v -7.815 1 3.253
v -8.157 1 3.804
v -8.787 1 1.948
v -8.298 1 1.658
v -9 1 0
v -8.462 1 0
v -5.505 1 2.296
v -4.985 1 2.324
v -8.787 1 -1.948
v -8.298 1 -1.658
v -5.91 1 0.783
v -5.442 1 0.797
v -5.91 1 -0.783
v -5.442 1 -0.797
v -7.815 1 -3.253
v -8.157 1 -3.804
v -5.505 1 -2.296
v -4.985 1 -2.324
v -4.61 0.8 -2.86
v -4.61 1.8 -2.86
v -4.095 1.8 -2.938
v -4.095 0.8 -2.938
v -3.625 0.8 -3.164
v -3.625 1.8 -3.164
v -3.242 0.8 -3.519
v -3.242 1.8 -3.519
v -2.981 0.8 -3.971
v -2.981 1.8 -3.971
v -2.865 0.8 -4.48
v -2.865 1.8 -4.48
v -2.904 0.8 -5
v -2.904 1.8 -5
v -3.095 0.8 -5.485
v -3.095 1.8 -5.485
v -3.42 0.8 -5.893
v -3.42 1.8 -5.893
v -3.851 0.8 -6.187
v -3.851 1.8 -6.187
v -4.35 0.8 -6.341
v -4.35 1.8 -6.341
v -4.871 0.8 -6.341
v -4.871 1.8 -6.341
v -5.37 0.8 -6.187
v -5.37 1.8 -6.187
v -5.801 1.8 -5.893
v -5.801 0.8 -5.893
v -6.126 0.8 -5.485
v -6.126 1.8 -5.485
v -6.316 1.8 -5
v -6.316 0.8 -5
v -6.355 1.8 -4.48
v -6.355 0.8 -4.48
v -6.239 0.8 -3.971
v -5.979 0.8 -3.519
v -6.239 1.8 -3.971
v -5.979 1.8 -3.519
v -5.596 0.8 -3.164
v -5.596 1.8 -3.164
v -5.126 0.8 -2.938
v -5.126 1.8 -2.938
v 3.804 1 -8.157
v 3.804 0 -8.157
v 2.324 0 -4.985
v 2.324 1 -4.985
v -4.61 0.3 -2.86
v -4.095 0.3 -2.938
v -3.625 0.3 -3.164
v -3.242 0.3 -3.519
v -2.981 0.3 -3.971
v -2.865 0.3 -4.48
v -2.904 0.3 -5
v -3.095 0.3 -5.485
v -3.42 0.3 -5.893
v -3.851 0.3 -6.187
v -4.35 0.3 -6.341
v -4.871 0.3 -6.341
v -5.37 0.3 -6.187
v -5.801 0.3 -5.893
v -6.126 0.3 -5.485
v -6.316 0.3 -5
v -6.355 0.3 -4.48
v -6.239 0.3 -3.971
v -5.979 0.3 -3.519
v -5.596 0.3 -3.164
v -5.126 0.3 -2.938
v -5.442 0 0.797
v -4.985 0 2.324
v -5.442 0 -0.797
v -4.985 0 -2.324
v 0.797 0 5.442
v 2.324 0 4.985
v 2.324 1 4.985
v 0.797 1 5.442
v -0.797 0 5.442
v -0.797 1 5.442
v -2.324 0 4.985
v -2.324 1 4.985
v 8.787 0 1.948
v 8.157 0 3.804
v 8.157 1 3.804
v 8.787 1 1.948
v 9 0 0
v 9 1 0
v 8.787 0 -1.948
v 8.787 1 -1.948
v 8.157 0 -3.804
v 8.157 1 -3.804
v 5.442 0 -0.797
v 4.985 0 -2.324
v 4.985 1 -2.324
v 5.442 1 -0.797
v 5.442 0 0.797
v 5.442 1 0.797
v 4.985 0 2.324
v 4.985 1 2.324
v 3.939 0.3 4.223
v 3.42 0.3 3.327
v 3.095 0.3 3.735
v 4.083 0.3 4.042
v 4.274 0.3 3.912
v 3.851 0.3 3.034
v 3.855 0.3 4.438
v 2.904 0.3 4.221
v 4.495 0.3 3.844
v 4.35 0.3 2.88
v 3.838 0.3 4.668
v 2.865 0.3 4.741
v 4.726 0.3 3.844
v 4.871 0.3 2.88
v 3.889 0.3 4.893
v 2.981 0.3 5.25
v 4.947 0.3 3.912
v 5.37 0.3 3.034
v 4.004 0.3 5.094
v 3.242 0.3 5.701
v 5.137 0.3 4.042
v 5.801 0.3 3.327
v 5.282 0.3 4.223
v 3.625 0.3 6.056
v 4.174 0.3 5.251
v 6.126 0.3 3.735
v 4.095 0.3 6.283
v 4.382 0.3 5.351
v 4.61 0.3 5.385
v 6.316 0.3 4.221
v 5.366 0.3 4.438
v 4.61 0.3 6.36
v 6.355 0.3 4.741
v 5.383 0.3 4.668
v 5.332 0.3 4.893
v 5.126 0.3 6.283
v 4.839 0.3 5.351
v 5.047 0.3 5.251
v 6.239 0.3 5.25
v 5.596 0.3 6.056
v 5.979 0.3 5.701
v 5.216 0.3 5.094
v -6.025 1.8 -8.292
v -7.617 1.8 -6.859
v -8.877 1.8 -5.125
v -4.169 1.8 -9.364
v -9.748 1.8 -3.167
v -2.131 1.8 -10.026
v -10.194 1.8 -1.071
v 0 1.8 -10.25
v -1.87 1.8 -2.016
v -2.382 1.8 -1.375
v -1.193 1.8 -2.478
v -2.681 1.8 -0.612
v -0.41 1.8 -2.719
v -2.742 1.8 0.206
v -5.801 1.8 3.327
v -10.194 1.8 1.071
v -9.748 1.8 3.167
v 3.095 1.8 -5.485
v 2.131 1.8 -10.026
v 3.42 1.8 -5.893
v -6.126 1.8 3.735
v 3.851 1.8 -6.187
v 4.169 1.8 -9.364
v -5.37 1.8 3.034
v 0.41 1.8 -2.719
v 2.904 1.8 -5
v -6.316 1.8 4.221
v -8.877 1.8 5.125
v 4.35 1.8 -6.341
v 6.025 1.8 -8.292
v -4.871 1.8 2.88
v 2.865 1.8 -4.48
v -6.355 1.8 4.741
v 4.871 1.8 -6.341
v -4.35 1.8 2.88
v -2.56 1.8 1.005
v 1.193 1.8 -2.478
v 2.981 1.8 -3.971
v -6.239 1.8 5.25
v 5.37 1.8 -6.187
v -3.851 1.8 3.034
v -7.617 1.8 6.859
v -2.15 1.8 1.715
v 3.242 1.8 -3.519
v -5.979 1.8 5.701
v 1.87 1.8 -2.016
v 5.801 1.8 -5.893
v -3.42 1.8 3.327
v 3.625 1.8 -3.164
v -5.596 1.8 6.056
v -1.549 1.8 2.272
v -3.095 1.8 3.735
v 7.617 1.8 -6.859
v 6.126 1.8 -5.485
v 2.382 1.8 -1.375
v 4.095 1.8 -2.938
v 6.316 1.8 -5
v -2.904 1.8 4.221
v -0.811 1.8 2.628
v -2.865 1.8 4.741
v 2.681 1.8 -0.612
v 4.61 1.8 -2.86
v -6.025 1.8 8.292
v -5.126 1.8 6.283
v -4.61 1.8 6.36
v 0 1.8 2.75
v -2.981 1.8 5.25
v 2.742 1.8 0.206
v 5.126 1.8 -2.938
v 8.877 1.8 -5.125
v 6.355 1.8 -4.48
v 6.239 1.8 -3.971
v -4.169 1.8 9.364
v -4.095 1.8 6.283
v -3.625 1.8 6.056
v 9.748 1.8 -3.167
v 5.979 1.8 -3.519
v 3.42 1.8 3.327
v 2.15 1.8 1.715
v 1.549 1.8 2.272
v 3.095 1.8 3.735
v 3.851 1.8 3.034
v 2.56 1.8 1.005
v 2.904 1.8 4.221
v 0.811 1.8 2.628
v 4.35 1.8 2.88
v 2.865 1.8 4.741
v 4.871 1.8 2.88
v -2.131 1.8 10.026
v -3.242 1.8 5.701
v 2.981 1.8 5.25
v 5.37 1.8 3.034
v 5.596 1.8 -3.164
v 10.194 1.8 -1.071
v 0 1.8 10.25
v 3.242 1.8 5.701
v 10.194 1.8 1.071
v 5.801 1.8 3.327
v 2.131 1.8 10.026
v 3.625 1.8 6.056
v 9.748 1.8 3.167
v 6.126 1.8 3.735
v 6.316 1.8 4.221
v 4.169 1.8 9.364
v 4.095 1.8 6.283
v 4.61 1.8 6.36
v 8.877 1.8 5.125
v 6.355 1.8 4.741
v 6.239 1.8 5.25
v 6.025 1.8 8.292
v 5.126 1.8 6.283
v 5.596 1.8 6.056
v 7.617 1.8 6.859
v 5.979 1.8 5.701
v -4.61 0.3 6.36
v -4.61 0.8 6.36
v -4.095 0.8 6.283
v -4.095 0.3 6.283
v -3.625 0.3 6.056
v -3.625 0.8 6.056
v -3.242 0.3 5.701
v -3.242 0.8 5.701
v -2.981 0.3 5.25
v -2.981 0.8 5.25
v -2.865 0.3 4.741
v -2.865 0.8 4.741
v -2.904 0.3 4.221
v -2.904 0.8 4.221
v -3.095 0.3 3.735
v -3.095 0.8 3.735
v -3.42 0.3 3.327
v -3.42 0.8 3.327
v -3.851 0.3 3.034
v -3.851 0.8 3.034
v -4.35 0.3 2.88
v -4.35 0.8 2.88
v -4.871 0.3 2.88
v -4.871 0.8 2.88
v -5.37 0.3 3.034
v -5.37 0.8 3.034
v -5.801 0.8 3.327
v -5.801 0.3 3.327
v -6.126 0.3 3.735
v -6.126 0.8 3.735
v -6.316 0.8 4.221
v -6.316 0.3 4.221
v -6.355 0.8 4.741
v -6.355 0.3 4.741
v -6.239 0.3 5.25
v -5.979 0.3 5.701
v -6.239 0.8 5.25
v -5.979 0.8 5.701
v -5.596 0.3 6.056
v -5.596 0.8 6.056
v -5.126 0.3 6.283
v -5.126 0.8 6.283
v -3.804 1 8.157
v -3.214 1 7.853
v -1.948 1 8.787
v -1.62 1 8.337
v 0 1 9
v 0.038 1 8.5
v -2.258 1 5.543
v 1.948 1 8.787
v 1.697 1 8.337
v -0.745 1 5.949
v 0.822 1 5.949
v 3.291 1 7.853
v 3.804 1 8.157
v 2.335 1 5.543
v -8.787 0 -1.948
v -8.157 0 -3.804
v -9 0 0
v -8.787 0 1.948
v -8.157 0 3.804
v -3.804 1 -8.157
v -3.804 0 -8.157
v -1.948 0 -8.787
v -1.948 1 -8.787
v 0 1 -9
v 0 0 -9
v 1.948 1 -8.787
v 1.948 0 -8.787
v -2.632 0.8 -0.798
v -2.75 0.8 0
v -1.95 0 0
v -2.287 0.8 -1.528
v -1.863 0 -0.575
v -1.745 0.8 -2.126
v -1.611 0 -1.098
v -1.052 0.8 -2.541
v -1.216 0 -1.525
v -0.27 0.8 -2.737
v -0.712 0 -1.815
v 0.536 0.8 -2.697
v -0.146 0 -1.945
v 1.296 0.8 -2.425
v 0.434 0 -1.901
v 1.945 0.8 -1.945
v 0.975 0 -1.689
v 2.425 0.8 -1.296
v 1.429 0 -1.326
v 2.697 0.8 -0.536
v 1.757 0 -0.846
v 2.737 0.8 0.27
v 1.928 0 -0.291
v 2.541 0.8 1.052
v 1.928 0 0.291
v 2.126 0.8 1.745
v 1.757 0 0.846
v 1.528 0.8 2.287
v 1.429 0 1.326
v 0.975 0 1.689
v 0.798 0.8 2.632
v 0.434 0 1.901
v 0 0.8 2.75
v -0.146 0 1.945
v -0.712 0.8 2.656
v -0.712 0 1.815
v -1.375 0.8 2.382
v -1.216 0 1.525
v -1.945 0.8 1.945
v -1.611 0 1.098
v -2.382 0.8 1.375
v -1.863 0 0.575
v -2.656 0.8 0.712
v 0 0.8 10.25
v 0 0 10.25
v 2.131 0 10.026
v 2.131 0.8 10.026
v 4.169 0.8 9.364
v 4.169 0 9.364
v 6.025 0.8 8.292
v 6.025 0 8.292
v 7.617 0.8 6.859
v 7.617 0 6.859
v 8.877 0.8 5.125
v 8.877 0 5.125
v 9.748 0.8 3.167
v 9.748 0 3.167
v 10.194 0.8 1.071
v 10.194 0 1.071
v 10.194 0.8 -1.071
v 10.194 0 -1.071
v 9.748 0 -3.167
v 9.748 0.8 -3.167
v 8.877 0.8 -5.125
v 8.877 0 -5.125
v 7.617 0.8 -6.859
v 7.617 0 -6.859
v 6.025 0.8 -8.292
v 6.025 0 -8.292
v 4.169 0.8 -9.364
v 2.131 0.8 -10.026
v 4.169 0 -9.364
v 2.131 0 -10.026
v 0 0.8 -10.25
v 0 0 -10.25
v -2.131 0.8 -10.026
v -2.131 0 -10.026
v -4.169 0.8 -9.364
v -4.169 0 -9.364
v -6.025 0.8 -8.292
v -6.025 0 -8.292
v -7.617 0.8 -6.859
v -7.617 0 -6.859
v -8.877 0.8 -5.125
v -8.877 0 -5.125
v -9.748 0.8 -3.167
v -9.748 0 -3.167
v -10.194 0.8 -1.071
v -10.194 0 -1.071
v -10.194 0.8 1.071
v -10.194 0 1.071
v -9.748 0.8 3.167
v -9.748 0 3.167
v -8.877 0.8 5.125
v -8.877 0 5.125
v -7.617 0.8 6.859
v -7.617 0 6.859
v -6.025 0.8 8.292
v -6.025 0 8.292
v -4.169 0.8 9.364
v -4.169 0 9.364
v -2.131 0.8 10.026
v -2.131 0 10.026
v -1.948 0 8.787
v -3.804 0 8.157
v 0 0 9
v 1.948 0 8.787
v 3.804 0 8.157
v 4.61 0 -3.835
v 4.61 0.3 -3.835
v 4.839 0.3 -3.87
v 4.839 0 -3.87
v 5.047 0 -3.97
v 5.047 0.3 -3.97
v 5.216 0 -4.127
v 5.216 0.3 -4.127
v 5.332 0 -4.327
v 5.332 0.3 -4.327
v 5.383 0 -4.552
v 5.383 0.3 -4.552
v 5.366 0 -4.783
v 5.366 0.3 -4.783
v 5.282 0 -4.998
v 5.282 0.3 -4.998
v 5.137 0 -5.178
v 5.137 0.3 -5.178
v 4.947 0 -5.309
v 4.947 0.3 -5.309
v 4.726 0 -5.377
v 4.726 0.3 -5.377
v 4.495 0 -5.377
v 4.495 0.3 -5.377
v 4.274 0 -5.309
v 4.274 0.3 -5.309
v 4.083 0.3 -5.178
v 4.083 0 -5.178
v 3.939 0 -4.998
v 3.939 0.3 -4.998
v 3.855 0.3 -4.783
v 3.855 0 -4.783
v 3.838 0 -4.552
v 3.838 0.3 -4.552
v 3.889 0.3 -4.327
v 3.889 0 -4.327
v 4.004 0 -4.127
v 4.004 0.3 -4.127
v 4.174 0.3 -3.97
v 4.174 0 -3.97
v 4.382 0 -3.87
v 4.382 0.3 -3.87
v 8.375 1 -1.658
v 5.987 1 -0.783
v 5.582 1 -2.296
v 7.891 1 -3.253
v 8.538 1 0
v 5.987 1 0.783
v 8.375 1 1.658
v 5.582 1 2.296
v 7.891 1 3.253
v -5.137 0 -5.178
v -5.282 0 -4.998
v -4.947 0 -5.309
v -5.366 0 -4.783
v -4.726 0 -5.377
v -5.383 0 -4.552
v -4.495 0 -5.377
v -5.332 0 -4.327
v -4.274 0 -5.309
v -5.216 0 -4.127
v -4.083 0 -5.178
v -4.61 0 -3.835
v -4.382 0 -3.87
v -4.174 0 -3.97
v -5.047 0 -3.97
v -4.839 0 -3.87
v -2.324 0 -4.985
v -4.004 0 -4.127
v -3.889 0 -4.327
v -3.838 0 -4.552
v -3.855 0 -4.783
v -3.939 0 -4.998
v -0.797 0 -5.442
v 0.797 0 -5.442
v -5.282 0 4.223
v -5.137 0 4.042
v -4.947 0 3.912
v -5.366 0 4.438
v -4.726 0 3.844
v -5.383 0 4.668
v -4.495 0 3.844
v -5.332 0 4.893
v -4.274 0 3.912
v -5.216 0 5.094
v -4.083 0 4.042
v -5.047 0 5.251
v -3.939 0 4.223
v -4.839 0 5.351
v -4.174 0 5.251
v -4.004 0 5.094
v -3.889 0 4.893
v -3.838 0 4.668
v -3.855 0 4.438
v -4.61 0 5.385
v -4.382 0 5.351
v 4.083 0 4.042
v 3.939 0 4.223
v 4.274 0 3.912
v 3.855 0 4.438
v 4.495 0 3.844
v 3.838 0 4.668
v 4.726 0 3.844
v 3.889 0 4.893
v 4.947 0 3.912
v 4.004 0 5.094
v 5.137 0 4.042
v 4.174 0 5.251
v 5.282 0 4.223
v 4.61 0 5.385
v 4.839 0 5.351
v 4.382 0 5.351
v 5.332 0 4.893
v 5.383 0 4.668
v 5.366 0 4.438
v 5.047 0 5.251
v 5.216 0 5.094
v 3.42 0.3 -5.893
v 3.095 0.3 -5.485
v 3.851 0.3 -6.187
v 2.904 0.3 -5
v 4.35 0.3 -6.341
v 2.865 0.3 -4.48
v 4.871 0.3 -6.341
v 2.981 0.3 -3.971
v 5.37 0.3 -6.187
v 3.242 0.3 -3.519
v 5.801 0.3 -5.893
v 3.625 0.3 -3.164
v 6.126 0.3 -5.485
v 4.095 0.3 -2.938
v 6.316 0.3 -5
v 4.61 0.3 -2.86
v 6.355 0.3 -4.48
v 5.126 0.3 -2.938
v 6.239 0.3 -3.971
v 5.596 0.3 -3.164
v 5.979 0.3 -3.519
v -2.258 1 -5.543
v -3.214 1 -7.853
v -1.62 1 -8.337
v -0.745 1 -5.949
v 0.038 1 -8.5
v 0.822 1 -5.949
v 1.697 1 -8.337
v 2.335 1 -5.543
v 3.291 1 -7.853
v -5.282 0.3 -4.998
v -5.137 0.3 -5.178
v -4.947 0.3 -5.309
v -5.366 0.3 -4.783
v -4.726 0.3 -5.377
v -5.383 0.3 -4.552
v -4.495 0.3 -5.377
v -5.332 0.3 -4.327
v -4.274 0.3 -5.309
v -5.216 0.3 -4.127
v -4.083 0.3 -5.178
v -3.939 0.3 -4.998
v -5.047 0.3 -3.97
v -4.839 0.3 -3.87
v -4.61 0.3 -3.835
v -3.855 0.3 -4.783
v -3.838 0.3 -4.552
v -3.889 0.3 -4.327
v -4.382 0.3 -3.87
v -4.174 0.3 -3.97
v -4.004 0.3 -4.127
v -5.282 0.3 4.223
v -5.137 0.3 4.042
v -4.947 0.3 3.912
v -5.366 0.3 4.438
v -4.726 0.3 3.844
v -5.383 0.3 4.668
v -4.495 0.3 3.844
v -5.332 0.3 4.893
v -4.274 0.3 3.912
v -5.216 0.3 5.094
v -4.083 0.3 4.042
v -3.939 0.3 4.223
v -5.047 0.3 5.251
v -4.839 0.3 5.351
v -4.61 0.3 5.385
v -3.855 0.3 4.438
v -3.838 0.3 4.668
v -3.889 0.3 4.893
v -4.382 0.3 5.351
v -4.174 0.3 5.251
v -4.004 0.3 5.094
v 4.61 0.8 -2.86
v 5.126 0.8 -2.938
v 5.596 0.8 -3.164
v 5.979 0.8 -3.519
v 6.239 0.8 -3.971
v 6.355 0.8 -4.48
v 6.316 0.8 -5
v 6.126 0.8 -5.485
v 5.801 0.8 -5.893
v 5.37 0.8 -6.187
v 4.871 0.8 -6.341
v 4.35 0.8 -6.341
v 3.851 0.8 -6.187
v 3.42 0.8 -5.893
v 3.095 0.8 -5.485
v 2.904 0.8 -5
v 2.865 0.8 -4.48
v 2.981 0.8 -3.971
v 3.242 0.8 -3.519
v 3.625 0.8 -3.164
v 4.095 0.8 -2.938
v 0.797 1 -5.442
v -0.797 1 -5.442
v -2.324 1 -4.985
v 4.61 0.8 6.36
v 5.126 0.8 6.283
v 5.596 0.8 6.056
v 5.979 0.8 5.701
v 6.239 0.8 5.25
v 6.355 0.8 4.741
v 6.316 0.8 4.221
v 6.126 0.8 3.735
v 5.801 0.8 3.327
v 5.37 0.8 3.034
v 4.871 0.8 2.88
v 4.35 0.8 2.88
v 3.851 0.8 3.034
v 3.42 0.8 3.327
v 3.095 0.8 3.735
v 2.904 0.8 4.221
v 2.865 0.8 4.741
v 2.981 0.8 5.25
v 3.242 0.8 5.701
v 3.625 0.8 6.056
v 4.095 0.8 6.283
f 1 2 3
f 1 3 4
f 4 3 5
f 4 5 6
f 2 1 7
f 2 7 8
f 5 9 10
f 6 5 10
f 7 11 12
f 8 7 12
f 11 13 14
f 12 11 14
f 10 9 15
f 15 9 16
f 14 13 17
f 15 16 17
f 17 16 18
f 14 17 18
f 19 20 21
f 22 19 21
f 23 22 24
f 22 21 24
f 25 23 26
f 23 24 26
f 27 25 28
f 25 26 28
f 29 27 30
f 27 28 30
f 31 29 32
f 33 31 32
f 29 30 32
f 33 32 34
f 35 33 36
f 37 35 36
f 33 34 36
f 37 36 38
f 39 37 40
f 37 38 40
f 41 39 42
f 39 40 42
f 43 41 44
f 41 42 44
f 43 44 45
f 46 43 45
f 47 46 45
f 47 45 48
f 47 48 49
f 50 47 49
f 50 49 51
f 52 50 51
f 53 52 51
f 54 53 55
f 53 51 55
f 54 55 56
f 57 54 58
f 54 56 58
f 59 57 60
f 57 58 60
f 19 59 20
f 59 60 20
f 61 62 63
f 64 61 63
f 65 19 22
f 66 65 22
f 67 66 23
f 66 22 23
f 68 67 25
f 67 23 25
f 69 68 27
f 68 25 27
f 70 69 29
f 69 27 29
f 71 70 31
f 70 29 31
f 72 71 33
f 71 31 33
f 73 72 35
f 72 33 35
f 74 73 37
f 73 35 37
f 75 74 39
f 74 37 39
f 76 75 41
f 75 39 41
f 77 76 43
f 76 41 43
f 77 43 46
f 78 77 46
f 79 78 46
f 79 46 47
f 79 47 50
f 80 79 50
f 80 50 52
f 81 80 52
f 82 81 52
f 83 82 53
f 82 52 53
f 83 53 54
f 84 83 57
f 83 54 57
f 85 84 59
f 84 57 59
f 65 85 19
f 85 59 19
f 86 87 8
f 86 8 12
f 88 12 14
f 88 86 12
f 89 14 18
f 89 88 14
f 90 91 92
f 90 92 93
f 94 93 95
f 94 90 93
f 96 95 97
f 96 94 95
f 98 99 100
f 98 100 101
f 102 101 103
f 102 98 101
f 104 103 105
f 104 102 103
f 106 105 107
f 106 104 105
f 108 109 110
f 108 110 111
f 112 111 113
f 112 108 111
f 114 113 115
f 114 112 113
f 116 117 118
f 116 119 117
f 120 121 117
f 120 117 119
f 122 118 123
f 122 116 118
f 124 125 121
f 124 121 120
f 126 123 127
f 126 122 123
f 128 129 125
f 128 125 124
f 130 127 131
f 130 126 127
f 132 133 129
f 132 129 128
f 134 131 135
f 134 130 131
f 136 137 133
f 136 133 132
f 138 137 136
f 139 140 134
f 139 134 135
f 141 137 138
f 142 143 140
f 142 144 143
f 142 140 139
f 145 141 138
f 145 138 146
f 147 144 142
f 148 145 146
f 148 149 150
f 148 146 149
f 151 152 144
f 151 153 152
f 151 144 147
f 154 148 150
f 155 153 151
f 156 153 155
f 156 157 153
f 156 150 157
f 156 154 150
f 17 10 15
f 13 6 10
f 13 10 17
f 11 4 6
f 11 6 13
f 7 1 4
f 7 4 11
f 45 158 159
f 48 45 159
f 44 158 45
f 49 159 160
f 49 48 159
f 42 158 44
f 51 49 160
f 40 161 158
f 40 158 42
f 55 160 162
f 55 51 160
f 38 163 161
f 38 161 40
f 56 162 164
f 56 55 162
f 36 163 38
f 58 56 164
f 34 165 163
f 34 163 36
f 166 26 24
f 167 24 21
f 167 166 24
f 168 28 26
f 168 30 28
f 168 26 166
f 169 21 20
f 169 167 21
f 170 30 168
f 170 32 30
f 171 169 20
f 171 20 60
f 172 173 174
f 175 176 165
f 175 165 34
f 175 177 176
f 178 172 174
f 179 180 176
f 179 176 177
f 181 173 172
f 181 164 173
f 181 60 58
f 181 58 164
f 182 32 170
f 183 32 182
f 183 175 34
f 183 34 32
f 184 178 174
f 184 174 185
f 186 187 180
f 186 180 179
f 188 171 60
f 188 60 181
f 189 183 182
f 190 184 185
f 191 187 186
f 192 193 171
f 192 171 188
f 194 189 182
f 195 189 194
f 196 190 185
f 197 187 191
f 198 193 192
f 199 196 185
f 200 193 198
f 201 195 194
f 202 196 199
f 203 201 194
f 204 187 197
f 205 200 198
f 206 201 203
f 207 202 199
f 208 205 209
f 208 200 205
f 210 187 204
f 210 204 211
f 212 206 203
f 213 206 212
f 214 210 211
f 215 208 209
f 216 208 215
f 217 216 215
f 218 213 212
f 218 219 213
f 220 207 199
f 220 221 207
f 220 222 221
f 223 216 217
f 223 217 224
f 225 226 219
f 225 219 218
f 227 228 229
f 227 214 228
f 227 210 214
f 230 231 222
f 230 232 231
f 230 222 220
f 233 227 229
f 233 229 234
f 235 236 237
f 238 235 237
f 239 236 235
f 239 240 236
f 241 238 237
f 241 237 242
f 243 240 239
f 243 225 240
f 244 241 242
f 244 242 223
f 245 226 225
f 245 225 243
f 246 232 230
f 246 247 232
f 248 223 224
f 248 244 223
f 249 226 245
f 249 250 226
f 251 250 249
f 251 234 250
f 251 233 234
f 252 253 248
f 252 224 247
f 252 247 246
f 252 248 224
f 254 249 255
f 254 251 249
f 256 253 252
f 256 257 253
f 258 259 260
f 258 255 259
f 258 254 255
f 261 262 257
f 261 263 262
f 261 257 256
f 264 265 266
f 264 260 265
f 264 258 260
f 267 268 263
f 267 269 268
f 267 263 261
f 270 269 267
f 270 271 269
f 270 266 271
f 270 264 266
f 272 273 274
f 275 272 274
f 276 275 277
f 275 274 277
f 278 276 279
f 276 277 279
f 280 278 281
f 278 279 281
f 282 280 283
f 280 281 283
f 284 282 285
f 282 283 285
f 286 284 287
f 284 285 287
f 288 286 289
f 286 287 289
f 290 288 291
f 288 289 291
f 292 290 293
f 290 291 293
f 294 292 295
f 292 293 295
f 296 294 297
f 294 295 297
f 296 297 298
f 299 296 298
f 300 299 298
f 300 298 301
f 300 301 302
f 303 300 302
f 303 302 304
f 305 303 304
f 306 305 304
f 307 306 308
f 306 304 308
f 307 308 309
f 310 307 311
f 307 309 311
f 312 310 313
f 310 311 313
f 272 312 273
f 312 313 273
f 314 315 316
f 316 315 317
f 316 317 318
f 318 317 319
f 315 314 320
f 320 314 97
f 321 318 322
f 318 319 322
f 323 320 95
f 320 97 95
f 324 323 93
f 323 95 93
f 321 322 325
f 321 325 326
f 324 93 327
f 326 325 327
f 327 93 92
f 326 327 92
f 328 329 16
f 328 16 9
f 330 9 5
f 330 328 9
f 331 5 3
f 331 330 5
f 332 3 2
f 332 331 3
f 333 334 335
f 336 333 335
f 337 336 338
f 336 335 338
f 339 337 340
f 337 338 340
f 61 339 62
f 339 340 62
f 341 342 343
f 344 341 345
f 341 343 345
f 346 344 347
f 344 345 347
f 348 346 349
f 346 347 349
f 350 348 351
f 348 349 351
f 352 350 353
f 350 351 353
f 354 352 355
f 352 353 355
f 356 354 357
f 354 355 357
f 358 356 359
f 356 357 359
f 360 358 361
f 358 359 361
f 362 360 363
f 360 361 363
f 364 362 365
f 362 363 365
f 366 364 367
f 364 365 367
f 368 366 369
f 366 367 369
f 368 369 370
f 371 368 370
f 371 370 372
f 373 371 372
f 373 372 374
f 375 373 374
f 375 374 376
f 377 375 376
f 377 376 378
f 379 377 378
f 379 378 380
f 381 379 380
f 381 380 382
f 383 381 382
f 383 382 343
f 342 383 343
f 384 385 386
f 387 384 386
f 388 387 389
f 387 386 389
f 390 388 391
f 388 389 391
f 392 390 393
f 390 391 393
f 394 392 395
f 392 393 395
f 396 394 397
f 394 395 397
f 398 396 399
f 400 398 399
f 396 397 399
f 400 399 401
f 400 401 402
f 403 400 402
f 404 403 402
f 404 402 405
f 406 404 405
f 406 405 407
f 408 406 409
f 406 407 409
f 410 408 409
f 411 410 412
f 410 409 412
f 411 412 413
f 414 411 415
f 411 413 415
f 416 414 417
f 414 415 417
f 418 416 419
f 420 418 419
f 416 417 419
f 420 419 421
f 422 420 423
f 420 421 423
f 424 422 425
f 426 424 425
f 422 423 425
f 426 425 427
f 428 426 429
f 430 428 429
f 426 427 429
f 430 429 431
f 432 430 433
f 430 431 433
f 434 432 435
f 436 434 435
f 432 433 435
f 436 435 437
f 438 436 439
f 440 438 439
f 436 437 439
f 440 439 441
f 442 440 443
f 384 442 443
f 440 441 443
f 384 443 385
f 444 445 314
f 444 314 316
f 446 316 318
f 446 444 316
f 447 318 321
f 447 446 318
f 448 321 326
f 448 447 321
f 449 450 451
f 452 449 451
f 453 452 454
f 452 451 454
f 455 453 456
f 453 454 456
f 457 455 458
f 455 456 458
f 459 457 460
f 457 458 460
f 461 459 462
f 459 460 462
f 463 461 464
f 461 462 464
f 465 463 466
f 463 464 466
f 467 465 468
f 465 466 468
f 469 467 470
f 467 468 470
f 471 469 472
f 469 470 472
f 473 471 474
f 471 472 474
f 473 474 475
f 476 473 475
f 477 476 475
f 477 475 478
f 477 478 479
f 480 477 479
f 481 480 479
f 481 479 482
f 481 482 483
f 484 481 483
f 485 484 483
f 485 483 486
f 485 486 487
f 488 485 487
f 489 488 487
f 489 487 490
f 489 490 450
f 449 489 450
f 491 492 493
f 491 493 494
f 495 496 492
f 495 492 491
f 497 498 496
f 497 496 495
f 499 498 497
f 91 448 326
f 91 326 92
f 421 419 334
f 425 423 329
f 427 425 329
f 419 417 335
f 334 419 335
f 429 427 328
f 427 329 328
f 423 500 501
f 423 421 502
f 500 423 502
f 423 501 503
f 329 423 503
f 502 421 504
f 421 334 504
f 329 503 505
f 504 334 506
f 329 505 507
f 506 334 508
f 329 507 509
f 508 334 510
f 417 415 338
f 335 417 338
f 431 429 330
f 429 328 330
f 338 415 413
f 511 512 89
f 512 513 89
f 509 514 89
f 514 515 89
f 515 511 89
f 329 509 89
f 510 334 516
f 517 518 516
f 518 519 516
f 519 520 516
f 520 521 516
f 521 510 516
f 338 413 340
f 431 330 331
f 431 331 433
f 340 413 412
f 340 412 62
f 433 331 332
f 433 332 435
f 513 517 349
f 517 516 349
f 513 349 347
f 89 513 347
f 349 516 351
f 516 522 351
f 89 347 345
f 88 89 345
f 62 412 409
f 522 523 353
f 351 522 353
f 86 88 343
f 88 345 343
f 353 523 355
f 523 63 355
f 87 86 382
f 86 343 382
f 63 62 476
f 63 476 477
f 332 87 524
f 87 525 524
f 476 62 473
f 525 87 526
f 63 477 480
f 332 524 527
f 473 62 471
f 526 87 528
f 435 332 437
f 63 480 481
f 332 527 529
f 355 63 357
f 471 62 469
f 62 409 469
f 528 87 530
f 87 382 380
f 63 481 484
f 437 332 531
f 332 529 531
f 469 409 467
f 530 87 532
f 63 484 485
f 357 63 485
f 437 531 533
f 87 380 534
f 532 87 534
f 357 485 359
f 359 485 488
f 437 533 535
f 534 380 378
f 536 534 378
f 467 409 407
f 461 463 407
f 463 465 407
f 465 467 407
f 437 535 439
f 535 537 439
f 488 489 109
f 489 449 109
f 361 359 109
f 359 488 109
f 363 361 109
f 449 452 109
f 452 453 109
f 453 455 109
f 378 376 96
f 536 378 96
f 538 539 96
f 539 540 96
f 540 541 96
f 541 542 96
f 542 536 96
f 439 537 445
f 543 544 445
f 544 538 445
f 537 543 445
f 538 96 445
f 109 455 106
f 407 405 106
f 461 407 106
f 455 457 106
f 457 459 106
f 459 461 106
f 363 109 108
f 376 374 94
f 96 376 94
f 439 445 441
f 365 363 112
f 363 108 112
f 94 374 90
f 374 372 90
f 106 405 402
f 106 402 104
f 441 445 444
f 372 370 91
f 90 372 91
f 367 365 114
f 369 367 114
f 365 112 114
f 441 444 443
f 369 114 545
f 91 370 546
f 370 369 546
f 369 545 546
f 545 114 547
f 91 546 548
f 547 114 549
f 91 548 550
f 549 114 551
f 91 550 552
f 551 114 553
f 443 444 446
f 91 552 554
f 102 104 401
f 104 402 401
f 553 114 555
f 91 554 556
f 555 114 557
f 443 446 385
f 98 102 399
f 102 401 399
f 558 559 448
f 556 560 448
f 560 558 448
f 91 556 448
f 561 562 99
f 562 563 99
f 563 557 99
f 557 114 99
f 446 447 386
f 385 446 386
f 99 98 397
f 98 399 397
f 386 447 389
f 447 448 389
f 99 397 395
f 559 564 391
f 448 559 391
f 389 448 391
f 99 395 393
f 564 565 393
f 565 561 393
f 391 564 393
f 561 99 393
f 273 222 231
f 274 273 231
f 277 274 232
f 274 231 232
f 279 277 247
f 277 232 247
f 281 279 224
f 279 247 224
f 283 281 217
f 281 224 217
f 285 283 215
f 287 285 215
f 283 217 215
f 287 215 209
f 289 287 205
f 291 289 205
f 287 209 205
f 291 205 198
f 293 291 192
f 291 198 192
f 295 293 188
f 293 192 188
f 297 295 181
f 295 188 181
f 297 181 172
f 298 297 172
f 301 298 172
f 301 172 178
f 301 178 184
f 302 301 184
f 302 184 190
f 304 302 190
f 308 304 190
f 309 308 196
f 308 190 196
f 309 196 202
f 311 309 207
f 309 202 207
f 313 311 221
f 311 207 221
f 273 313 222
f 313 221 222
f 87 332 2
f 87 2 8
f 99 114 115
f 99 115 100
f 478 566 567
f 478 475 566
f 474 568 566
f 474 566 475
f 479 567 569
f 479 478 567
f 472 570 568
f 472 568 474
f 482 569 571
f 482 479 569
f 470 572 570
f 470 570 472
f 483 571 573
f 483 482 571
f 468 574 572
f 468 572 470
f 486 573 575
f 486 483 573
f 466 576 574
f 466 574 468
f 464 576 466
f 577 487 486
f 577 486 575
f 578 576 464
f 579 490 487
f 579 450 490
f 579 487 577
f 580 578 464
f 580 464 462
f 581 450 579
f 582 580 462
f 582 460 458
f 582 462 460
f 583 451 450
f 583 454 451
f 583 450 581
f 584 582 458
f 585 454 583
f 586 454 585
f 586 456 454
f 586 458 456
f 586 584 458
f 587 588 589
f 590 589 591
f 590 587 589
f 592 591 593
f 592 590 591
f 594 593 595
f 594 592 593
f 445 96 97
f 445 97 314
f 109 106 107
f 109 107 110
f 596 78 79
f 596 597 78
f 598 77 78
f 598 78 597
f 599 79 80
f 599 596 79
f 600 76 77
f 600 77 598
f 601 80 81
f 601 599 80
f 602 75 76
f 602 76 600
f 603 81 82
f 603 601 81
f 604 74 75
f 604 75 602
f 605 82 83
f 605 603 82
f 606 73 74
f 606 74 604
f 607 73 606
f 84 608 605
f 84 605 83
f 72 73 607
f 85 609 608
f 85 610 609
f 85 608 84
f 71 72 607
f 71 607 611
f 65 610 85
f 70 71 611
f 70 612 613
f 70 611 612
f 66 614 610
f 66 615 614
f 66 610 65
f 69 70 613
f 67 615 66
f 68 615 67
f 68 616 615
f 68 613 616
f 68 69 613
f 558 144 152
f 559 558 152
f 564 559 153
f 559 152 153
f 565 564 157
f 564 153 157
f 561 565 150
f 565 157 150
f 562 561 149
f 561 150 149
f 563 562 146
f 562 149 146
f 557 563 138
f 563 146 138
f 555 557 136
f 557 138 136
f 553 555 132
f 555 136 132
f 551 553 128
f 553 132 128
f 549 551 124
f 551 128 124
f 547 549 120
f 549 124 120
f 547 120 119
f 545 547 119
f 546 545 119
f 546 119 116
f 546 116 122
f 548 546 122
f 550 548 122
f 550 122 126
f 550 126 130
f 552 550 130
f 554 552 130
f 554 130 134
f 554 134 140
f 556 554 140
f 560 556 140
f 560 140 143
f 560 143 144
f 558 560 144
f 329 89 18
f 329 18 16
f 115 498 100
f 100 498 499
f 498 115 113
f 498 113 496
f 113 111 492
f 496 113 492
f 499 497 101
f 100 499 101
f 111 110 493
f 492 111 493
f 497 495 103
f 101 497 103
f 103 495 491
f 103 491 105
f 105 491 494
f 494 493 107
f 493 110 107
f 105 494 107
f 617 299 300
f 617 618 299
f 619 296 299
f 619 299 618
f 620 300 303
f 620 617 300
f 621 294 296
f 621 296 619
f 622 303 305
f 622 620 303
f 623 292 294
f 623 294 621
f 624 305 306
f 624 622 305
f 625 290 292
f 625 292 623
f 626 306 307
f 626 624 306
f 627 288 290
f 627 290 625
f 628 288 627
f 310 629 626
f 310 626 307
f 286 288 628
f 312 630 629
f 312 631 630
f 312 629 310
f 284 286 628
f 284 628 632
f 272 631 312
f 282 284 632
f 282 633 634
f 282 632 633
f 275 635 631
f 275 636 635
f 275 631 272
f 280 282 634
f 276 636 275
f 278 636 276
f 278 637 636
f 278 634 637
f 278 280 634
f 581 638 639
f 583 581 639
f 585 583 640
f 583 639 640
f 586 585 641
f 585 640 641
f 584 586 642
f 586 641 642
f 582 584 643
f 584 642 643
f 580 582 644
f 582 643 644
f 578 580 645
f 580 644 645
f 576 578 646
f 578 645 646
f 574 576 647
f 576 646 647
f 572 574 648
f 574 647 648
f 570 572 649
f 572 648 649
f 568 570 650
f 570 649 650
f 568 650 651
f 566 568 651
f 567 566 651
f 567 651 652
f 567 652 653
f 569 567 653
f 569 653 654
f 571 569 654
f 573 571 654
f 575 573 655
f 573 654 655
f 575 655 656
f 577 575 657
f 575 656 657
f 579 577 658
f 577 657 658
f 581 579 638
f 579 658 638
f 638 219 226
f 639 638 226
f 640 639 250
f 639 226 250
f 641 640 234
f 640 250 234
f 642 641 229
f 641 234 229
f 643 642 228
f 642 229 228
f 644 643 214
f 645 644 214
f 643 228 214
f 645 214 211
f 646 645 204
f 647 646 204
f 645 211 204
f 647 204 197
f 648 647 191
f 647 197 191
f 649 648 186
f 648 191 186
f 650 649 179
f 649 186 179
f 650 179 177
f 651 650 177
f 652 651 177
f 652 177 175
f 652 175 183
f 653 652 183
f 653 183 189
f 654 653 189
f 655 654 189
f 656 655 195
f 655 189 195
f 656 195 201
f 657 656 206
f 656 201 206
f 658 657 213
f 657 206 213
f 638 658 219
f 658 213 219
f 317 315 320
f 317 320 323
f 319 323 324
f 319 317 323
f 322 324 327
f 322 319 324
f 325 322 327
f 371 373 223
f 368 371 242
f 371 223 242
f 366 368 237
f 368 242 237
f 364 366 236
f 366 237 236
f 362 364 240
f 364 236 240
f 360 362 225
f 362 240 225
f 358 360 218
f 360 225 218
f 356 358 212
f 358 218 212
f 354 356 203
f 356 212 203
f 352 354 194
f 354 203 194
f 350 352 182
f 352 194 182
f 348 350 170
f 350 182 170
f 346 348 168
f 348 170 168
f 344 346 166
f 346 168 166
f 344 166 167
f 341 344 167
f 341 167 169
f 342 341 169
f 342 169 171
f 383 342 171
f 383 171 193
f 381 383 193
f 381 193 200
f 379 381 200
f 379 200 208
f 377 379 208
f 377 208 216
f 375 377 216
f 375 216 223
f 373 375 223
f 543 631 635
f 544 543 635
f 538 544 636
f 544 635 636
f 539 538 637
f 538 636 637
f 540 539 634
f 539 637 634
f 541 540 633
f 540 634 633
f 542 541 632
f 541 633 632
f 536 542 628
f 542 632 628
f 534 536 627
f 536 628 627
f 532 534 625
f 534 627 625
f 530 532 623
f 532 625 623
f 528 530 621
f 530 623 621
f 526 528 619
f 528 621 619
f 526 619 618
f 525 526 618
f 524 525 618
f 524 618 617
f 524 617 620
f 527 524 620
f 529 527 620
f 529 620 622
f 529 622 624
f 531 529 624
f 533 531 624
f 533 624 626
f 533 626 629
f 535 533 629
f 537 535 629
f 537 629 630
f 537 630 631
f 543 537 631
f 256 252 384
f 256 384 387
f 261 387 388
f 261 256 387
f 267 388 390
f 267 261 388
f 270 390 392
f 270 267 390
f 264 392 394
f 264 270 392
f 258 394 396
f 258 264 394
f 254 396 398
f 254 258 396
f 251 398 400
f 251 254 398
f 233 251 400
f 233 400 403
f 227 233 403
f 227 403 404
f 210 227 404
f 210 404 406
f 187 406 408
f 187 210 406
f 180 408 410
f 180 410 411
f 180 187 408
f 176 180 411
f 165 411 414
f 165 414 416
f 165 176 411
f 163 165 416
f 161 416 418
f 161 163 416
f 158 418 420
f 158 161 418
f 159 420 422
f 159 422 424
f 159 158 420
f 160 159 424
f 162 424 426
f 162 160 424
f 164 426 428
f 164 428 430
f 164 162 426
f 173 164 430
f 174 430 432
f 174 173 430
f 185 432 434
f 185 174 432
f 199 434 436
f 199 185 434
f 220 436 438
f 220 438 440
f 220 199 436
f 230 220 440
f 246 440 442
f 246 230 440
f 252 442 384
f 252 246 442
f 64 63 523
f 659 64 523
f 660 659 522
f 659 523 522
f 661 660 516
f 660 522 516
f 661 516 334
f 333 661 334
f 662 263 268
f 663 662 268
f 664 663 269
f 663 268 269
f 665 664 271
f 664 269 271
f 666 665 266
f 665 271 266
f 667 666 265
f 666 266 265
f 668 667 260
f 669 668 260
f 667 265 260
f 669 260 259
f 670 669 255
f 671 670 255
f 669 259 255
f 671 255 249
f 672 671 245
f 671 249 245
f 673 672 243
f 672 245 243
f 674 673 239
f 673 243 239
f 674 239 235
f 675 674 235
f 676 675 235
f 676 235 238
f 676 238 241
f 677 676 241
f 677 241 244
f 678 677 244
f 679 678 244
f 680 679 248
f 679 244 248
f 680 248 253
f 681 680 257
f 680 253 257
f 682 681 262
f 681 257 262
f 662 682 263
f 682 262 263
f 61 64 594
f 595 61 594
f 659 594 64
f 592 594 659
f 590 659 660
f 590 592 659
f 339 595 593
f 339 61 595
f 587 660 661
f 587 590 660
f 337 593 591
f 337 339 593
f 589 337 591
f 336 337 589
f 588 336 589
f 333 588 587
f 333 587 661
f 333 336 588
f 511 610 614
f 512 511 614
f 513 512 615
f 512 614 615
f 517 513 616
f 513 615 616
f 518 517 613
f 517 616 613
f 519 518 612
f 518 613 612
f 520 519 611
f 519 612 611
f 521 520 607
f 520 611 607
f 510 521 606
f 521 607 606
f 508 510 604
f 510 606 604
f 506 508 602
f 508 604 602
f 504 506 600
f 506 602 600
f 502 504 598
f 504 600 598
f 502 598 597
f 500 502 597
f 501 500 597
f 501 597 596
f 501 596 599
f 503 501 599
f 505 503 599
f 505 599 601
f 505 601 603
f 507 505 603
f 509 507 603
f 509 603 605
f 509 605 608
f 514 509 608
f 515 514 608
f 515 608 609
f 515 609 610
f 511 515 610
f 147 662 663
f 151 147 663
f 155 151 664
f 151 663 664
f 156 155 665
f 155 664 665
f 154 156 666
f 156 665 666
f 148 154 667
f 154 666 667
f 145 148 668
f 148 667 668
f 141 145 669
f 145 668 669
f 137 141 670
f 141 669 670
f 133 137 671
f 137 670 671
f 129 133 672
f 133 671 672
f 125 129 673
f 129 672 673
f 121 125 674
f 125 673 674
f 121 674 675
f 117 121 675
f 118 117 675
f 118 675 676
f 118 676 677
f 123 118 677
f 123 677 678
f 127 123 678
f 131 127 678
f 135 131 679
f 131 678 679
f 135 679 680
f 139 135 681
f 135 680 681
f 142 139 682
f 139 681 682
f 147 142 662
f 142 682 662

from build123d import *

# Parameters (mm, degrees)
SKETCH1_R                                         = 10.25
BOSS_EXTRUDE1_DEPTH                               = 0.8
CSK_FOR_M2_5_FLAT_HEAD_MACHINE_SCREW1_D           = 2.9
CSK_FOR_M2_5_FLAT_HEAD_MACHINE_SCREW1_DEPTH       = 15
CSK_FOR_M2_5_FLAT_HEAD_MACHINE_SCREW1_CSINK_D     = 5.5
CSK_FOR_M2_5_FLAT_HEAD_MACHINE_SCREW1_CSINK_ANGLE = 90
CSK_FOR_M2_5_FLAT_HEAD_MACHINE_SCREW1_TIP         = 0.871247898
SKETCH2_R                                         = 1.75
CUT_EXTRUDE1_DEPTH                                = 0.5
SKETCH5_R                                         = 0.775
CUT_EXTRUDE2_DEPTH                                = 0.5
BOSS_EXTRUDE2_START                               = 1
SKETCH6_R                                         = 10.25
SKETCH6_R_2                                       = 1.75
SKETCH6_R_3                                       = 2.75
BOSS_EXTRUDE2_DEPTH                               = 1
CUT_EXTRUDE3_DEPTH                                = 1
CUT_EXTRUDE4_DEPTH                                = 1


with BuildPart() as part:
    # Sketch1 → Boss-Extrude1 (new body)
    with BuildSketch(Plane(origin=(0, 0, 0), x_dir=(1, 0, 0), z_dir=(0, 1, 0))):
        with Locations(Location((0, 0, 0), (0, 0, 270))):
            Circle(SKETCH1_R)
    extrude(amount=BOSS_EXTRUDE1_DEPTH)

    # CSK for M2.5 Flat Head Machine Screw1
    with Locations(Plane(origin=(0, 0.8, 0), x_dir=(1, 0, 0), z_dir=(0, 1, 0))):
        with Locations((0, 0)):
            CounterSinkHole(CSK_FOR_M2_5_FLAT_HEAD_MACHINE_SCREW1_D / 2, CSK_FOR_M2_5_FLAT_HEAD_MACHINE_SCREW1_CSINK_D / 2, depth=CSK_FOR_M2_5_FLAT_HEAD_MACHINE_SCREW1_DEPTH, counter_sink_angle=CSK_FOR_M2_5_FLAT_HEAD_MACHINE_SCREW1_CSINK_ANGLE)
            with Locations((0, 0, -(CSK_FOR_M2_5_FLAT_HEAD_MACHINE_SCREW1_DEPTH + CSK_FOR_M2_5_FLAT_HEAD_MACHINE_SCREW1_TIP / 2))):  # 118° drill point
                Cone(0, CSK_FOR_M2_5_FLAT_HEAD_MACHINE_SCREW1_D / 2, CSK_FOR_M2_5_FLAT_HEAD_MACHINE_SCREW1_TIP, mode=Mode.SUBTRACT)

    # Sketch2 → Cut-Extrude1 (cut)
    with BuildSketch(Plane(origin=(0, 0.8, 0), x_dir=(1, 0, 0), z_dir=(0, 1, 0))):
        with Locations(Location((-4.610336213, -4.610336213, 0), (0, 0, 270))):
            Circle(SKETCH2_R)
        with Locations(Location((4.610336213, 4.610336213, 0), (0, 0, 270))):
            Circle(SKETCH2_R)
        with Locations(Location((4.610336213, -4.610336213, 0), (0, 0, 270))):
            Circle(SKETCH2_R)
        with Locations(Location((-4.610336213, 4.610336213, 0), (0, 0, 270))):
            Circle(SKETCH2_R)
    extrude(amount=-CUT_EXTRUDE1_DEPTH, mode=Mode.SUBTRACT)

    # Sketch5 → Cut-Extrude2 (cut)
    with BuildSketch(Plane(origin=(0, 0.3, 0), x_dir=(1, 0, 0), z_dir=(0, 1, 0))):
        with Locations(Location((-4.610336213, -4.610336213, 0), (0, 0, 270))):
            Circle(SKETCH5_R)
        with Locations(Location((4.610336213, 4.610336213, 0), (0, 0, 270))):
            Circle(SKETCH5_R)
        with Locations(Location((4.610336213, -4.610336213, 0), (0, 0, 270))):
            Circle(SKETCH5_R)
        with Locations(Location((-4.610336213, 4.610336213, 0), (0, 0, 270))):
            Circle(SKETCH5_R)
    extrude(amount=-CUT_EXTRUDE2_DEPTH, mode=Mode.SUBTRACT)

    # Sketch6 → Boss-Extrude2 (add)
    with BuildSketch(Plane(origin=(0, 0.8, 0), x_dir=(1, 0, 0), z_dir=(0, 1, 0)).offset(BOSS_EXTRUDE2_START)):
        with Locations(Location((0, 0, 0), (0, 0, 270))):
            Circle(SKETCH6_R)
        with Locations(Location((4.610336213, 4.610336213, 0), (0, 0, 270))):
            Circle(SKETCH6_R_2, mode=Mode.SUBTRACT)
        with Locations(Location((0, 0, 0), (0, 0, 270))):
            Circle(SKETCH6_R_3, mode=Mode.SUBTRACT)
        with Locations(Location((-4.610336213, -4.610336213, 0), (0, 0, 270))):
            Circle(SKETCH6_R_2, mode=Mode.SUBTRACT)
        with Locations(Location((4.610336213, -4.610336213, 0), (0, 0, 270))):
            Circle(SKETCH6_R_2, mode=Mode.SUBTRACT)
        with Locations(Location((-4.610336213, 4.610336213, 0), (0, 0, 270))):
            Circle(SKETCH6_R_2, mode=Mode.SUBTRACT)
    extrude(amount=-BOSS_EXTRUDE2_DEPTH)

    # Sketch12 → Cut-Extrude3 (cut)
    with BuildSketch(Plane.XZ):
        with BuildLine():
            Line((-3.21438925, 7.852976026), (-2.257680669, 5.543277195))
            ThreePointArc((-2.257680669, 5.543277195), (0.038419926, 6), (2.33452052, 5.543277195))
            Line((2.33452052, 5.543277195), (3.291229101, 7.852976026))
            ThreePointArc((3.291229101, 7.852976026), (0.038419926, 8.5), (-3.21438925, 7.852976026))
        make_face()
        with BuildLine():
            Line((-5.50485727, 2.296100594), (-7.814556101, 3.252809175))
            ThreePointArc((-7.814556101, 3.252809175), (-8.461580074, 0), (-7.814556101, -3.252809175))
            Line((-7.814556101, -3.252809175), (-5.50485727, -2.296100594))
            ThreePointArc((-5.50485727, -2.296100594), (-5.961580074, 0), (-5.50485727, 2.296100594))
        make_face()
        with BuildLine():
            Line((-2.257680669, -5.543277195), (-3.21438925, -7.852976026))
            ThreePointArc((-3.21438925, -7.852976026), (0.038419926, -8.5), (3.291229101, -7.852976026))
            Line((3.291229101, -7.852976026), (2.33452052, -5.543277195))
            ThreePointArc((2.33452052, -5.543277195), (0.038419926, -6), (-2.257680669, -5.543277195))
        make_face()
        with BuildLine():
            Line((7.891395952, 3.252809175), (5.581697121, 2.296100594))
            ThreePointArc((5.581697121, 2.296100594), (6.038419926, 0), (5.581697121, -2.296100594))
            Line((5.581697121, -2.296100594), (7.891395952, -3.252809175))
            ThreePointArc((7.891395952, -3.252809175), (8.538419926, 0), (7.891395952, 3.252809175))
        make_face()
    extrude(amount=-CUT_EXTRUDE3_DEPTH, mode=Mode.SUBTRACT)

    # Sketch13 → Cut-Extrude4 (cut)
    with BuildSketch(Plane(origin=(0, 0, 0), x_dir=(-1, 0, 0), z_dir=(0, -1, 0))):
        with BuildLine():
            Line((2.32440044, 4.984692829), (3.803564356, 8.156770083))
            ThreePointArc((3.803564356, 8.156770083), (0, 9), (-3.803564356, 8.156770083))
            Line((-3.803564356, 8.156770083), (-2.32440044, 4.984692829))
            ThreePointArc((-2.32440044, 4.984692829), (0, 5.5), (2.32440044, 4.984692829))
        make_face()
        with BuildLine():
            Line((4.984692829, 2.32440044), (8.156770083, 3.803564356))
            ThreePointArc((8.156770083, 3.803564356), (9, 0), (8.156770083, -3.803564356))
            Line((8.156770083, -3.803564356), (4.984692829, -2.32440044))
            ThreePointArc((4.984692829, -2.32440044), (5.5, 0), (4.984692829, 2.32440044))
        make_face()
        with BuildLine():
            Line((2.32440044, -4.984692829), (3.803564356, -8.156770083))
            ThreePointArc((3.803564356, -8.156770083), (0, -9), (-3.803564356, -8.156770083))
            Line((-3.803564356, -8.156770083), (-2.32440044, -4.984692829))
            ThreePointArc((-2.32440044, -4.984692829), (0, -5.5), (2.32440044, -4.984692829))
        make_face()
        with BuildLine():
            Line((-4.984692829, -2.32440044), (-8.156770083, -3.803564356))
            ThreePointArc((-8.156770083, -3.803564356), (-9, 0), (-8.156770083, 3.803564356))
            Line((-8.156770083, 3.803564356), (-4.984692829, 2.32440044))
            ThreePointArc((-4.984692829, 2.32440044), (-5.5, 0), (-4.984692829, -2.32440044))
        make_face()
    extrude(amount=-CUT_EXTRUDE4_DEPTH, mode=Mode.SUBTRACT)


solid = part.part
